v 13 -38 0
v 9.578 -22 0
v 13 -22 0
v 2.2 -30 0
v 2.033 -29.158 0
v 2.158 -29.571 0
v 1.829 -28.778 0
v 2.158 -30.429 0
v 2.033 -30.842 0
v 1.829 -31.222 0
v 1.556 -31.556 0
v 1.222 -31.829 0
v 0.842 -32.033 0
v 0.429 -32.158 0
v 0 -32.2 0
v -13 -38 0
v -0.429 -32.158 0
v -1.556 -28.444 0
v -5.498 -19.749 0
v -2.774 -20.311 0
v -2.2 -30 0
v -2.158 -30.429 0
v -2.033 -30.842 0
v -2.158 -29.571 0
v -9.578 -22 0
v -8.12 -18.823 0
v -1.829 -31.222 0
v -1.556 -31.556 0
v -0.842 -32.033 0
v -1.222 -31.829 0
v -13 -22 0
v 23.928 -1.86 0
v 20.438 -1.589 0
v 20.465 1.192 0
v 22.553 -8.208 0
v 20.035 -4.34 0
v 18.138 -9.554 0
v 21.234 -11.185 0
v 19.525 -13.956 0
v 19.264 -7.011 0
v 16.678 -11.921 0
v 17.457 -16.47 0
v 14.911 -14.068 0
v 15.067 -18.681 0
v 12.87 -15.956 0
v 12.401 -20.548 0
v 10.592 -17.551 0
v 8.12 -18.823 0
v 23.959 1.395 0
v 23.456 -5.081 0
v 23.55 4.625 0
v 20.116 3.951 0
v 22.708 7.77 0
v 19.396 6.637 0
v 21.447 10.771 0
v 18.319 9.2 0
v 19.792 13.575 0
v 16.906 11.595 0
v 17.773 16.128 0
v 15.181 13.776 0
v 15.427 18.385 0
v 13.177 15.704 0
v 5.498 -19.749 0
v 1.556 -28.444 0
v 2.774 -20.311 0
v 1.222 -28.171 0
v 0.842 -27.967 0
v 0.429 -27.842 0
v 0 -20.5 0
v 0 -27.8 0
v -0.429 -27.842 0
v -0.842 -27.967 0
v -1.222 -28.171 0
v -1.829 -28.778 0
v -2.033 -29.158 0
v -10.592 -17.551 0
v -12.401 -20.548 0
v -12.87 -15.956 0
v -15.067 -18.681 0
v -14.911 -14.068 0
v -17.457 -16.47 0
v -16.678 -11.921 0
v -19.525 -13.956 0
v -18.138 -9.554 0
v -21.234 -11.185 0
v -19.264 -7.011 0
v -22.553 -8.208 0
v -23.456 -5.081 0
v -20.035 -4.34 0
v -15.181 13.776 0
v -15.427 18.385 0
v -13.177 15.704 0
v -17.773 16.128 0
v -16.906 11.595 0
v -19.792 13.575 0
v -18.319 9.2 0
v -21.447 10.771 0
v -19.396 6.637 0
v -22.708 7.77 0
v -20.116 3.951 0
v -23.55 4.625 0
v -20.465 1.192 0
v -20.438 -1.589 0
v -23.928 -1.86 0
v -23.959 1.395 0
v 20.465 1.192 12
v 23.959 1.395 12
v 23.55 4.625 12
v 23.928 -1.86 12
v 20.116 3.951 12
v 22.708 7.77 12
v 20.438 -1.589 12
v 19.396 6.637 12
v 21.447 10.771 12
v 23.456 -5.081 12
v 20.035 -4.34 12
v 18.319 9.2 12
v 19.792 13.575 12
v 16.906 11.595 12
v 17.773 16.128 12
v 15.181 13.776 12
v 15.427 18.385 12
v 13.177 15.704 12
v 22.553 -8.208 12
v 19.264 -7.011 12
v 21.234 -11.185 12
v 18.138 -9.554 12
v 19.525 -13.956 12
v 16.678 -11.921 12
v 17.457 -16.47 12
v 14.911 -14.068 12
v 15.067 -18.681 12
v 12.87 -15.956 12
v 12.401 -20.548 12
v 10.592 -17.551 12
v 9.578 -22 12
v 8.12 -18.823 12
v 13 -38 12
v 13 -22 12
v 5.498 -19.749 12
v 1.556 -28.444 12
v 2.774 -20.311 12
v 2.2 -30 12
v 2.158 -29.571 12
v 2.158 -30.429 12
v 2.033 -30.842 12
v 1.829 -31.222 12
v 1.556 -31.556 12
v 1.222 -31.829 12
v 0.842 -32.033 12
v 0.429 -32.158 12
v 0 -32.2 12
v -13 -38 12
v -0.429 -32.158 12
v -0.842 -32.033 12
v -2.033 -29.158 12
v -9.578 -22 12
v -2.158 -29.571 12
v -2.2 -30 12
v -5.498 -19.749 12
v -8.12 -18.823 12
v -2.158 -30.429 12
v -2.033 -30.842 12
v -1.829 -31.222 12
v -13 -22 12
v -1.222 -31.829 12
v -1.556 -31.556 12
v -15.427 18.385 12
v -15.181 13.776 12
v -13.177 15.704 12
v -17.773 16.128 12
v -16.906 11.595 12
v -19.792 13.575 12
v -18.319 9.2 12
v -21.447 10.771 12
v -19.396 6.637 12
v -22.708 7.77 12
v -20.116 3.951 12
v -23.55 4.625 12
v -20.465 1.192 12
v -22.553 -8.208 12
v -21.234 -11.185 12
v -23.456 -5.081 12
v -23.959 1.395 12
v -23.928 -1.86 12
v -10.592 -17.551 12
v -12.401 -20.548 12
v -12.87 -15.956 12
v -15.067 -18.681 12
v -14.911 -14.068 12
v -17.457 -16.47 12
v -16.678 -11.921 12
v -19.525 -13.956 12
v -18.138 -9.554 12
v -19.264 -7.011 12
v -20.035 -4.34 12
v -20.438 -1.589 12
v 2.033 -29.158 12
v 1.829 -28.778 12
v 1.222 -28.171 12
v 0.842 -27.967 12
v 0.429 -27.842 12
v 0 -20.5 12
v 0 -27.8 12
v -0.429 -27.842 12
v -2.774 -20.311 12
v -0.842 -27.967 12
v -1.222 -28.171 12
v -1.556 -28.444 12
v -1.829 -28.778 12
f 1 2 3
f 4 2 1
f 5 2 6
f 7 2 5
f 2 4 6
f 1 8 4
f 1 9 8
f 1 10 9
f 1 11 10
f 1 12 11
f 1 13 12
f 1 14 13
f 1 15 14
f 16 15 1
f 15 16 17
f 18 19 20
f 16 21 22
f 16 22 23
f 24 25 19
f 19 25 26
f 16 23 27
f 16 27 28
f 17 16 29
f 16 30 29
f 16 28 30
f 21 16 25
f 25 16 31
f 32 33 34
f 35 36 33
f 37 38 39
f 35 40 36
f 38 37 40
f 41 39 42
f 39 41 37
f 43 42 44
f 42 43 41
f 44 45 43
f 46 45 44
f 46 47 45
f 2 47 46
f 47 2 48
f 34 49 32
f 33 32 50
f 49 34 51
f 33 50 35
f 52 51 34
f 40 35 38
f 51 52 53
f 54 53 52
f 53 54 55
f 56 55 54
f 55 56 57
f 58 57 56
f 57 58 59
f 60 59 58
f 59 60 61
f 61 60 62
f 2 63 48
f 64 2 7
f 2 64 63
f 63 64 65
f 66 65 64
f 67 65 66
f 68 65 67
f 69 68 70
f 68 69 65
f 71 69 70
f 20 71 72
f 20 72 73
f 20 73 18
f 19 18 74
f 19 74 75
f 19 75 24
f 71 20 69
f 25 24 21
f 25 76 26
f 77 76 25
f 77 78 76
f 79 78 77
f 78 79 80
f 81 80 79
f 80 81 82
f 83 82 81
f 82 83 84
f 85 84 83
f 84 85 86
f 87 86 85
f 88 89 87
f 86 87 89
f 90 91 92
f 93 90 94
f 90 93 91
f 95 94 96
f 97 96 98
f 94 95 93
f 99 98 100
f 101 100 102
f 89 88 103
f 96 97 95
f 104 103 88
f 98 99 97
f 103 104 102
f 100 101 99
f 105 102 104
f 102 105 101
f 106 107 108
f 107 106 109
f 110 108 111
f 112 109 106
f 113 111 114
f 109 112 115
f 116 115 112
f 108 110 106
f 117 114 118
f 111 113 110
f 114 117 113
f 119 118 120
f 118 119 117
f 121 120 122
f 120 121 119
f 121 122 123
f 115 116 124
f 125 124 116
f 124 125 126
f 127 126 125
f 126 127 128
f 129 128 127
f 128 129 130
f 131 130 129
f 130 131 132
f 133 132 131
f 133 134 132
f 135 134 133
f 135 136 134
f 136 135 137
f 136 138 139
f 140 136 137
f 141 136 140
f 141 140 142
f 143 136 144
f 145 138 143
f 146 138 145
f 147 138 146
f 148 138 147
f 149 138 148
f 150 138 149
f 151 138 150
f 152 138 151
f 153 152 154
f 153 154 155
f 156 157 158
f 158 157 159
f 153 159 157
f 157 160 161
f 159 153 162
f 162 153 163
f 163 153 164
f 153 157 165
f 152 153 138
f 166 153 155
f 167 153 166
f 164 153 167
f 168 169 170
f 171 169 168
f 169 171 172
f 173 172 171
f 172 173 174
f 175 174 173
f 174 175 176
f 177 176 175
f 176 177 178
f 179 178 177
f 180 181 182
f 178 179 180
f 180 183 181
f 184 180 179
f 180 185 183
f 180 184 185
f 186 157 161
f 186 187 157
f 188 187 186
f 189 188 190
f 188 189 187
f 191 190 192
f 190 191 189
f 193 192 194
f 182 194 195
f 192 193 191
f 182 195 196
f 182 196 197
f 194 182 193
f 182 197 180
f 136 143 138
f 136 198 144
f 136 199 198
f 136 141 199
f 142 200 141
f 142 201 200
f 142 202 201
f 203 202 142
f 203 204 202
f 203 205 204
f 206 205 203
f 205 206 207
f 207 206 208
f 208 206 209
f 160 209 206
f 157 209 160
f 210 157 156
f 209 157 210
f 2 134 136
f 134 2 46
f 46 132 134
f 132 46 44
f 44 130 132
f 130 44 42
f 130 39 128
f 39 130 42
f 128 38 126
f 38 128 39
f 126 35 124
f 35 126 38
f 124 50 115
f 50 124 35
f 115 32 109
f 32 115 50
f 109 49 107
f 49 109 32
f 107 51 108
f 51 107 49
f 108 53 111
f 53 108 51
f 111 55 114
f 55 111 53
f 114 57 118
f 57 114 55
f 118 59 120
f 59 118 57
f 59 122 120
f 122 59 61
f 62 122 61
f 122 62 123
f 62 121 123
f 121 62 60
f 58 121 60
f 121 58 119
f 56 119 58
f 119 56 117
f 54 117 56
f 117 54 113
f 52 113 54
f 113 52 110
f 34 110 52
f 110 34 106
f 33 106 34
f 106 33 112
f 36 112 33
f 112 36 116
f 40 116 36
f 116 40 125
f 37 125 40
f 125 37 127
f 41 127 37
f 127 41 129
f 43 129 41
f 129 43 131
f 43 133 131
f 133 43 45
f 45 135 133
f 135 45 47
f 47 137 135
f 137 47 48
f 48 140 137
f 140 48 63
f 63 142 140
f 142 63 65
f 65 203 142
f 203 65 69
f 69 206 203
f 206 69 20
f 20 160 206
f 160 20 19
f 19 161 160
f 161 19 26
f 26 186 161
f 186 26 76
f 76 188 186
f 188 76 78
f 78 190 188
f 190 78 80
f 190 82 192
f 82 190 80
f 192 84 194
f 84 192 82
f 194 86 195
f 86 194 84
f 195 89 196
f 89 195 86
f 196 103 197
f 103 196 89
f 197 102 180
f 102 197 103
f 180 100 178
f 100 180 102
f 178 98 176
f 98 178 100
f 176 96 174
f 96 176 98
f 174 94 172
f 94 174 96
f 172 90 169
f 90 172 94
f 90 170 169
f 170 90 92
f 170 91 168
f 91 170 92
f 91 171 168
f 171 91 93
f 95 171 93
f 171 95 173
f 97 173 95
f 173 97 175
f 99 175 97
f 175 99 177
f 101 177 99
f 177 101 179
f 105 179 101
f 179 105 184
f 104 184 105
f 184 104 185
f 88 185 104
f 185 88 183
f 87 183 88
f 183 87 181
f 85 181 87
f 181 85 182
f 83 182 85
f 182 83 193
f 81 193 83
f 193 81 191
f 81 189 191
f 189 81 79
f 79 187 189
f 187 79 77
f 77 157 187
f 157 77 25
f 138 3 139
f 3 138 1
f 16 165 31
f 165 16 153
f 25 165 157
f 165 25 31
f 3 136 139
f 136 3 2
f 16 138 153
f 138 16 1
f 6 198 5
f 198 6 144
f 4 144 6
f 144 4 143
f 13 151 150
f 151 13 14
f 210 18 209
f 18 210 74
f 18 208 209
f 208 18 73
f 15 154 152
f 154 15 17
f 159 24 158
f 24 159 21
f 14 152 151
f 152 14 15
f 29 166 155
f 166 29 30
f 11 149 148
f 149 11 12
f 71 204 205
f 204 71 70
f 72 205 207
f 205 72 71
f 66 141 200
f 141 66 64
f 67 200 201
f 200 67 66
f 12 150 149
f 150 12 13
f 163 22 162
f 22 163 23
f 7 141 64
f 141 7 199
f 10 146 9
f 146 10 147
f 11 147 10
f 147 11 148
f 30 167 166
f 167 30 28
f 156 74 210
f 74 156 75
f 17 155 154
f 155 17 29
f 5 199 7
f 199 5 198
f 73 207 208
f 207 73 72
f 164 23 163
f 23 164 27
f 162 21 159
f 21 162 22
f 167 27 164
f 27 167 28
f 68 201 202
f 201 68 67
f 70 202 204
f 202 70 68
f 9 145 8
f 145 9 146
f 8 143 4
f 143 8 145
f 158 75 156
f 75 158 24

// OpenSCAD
$fn = 32;

// ----------------------------------------------------------------------
// Spring clip: 48 mm outside, 3.5 mm band, 80 degree opening
// ----------------------------------------------------------------------

// --- parameters (mm) ---
outer_r = 24;             // clip outside radius
inner_r = 20.5;           // clip bore radius
band = 3.5;               // band thickness
clip_w = 12;              // clip width
opening = 80;             // opening angle
tab_w = 26;               // tab width
tab_len = 14;             // tab length past the clip
tab_hole = 4.4;           // tab fixing hole

clip_profile = [[-15.427, 18.385], [-17.773, 16.128], [-19.792, 13.575], [-21.447, 10.771], [-22.708, 7.77], [-23.55, 4.625], [-23.959, 1.395], [-23.928, -1.86], [-23.456, -5.081], [-22.553, -8.208], [-21.234, -11.185], [-19.525, -13.956], [-17.457, -16.47], [-15.067, -18.681], [-12.401, -20.548], [-9.506, -22.037], [-6.436, -23.121], [-3.248, -23.779], [0, -24], [3.248, -23.779], [6.436, -23.121], [9.506, -22.037], [12.401, -20.548], [15.067, -18.681], [17.457, -16.47], [19.525, -13.956], [21.234, -11.185], [22.553, -8.208], [23.456, -5.081], [23.928, -1.86], [23.959, 1.395], [23.55, 4.625], [22.708, 7.77], [21.447, 10.771], [19.792, 13.575], [17.773, 16.128], [15.427, 18.385], [13.177, 15.704], [15.181, 13.776], [16.906, 11.595], [18.319, 9.2], [19.396, 6.637], [20.116, 3.951], [20.465, 1.192], [20.438, -1.589], [20.035, -4.34], [19.264, -7.011], [18.138, -9.554], [16.678, -11.921], [14.911, -14.068], [12.87, -15.956], [10.592, -17.551], [8.12, -18.823], [5.498, -19.749], [2.774, -20.311], [0, -20.5], [-2.774, -20.311], [-5.498, -19.749], [-8.12, -18.823], [-10.592, -17.551], [-12.87, -15.956], [-14.911, -14.068], [-16.678, -11.921], [-18.138, -9.554], [-19.264, -7.011], [-20.035, -4.34], [-20.438, -1.589], [-20.465, 1.192], [-20.116, 3.951], [-19.396, 6.637], [-18.319, 9.2], [-16.906, 11.595], [-15.181, 13.776], [-13.177, 15.704]];

difference() {
  union() {
    linear_extrude(height = clip_w) polygon(clip_profile);
    /* mounting tab, sunk 2 mm into the band */
    translate([-13, -38, 0]) cube([tab_w, 16, clip_w]);
  }
  translate([0, -30, -2.5]) cylinder(h = clip_w + 5, d = tab_hole);
}
